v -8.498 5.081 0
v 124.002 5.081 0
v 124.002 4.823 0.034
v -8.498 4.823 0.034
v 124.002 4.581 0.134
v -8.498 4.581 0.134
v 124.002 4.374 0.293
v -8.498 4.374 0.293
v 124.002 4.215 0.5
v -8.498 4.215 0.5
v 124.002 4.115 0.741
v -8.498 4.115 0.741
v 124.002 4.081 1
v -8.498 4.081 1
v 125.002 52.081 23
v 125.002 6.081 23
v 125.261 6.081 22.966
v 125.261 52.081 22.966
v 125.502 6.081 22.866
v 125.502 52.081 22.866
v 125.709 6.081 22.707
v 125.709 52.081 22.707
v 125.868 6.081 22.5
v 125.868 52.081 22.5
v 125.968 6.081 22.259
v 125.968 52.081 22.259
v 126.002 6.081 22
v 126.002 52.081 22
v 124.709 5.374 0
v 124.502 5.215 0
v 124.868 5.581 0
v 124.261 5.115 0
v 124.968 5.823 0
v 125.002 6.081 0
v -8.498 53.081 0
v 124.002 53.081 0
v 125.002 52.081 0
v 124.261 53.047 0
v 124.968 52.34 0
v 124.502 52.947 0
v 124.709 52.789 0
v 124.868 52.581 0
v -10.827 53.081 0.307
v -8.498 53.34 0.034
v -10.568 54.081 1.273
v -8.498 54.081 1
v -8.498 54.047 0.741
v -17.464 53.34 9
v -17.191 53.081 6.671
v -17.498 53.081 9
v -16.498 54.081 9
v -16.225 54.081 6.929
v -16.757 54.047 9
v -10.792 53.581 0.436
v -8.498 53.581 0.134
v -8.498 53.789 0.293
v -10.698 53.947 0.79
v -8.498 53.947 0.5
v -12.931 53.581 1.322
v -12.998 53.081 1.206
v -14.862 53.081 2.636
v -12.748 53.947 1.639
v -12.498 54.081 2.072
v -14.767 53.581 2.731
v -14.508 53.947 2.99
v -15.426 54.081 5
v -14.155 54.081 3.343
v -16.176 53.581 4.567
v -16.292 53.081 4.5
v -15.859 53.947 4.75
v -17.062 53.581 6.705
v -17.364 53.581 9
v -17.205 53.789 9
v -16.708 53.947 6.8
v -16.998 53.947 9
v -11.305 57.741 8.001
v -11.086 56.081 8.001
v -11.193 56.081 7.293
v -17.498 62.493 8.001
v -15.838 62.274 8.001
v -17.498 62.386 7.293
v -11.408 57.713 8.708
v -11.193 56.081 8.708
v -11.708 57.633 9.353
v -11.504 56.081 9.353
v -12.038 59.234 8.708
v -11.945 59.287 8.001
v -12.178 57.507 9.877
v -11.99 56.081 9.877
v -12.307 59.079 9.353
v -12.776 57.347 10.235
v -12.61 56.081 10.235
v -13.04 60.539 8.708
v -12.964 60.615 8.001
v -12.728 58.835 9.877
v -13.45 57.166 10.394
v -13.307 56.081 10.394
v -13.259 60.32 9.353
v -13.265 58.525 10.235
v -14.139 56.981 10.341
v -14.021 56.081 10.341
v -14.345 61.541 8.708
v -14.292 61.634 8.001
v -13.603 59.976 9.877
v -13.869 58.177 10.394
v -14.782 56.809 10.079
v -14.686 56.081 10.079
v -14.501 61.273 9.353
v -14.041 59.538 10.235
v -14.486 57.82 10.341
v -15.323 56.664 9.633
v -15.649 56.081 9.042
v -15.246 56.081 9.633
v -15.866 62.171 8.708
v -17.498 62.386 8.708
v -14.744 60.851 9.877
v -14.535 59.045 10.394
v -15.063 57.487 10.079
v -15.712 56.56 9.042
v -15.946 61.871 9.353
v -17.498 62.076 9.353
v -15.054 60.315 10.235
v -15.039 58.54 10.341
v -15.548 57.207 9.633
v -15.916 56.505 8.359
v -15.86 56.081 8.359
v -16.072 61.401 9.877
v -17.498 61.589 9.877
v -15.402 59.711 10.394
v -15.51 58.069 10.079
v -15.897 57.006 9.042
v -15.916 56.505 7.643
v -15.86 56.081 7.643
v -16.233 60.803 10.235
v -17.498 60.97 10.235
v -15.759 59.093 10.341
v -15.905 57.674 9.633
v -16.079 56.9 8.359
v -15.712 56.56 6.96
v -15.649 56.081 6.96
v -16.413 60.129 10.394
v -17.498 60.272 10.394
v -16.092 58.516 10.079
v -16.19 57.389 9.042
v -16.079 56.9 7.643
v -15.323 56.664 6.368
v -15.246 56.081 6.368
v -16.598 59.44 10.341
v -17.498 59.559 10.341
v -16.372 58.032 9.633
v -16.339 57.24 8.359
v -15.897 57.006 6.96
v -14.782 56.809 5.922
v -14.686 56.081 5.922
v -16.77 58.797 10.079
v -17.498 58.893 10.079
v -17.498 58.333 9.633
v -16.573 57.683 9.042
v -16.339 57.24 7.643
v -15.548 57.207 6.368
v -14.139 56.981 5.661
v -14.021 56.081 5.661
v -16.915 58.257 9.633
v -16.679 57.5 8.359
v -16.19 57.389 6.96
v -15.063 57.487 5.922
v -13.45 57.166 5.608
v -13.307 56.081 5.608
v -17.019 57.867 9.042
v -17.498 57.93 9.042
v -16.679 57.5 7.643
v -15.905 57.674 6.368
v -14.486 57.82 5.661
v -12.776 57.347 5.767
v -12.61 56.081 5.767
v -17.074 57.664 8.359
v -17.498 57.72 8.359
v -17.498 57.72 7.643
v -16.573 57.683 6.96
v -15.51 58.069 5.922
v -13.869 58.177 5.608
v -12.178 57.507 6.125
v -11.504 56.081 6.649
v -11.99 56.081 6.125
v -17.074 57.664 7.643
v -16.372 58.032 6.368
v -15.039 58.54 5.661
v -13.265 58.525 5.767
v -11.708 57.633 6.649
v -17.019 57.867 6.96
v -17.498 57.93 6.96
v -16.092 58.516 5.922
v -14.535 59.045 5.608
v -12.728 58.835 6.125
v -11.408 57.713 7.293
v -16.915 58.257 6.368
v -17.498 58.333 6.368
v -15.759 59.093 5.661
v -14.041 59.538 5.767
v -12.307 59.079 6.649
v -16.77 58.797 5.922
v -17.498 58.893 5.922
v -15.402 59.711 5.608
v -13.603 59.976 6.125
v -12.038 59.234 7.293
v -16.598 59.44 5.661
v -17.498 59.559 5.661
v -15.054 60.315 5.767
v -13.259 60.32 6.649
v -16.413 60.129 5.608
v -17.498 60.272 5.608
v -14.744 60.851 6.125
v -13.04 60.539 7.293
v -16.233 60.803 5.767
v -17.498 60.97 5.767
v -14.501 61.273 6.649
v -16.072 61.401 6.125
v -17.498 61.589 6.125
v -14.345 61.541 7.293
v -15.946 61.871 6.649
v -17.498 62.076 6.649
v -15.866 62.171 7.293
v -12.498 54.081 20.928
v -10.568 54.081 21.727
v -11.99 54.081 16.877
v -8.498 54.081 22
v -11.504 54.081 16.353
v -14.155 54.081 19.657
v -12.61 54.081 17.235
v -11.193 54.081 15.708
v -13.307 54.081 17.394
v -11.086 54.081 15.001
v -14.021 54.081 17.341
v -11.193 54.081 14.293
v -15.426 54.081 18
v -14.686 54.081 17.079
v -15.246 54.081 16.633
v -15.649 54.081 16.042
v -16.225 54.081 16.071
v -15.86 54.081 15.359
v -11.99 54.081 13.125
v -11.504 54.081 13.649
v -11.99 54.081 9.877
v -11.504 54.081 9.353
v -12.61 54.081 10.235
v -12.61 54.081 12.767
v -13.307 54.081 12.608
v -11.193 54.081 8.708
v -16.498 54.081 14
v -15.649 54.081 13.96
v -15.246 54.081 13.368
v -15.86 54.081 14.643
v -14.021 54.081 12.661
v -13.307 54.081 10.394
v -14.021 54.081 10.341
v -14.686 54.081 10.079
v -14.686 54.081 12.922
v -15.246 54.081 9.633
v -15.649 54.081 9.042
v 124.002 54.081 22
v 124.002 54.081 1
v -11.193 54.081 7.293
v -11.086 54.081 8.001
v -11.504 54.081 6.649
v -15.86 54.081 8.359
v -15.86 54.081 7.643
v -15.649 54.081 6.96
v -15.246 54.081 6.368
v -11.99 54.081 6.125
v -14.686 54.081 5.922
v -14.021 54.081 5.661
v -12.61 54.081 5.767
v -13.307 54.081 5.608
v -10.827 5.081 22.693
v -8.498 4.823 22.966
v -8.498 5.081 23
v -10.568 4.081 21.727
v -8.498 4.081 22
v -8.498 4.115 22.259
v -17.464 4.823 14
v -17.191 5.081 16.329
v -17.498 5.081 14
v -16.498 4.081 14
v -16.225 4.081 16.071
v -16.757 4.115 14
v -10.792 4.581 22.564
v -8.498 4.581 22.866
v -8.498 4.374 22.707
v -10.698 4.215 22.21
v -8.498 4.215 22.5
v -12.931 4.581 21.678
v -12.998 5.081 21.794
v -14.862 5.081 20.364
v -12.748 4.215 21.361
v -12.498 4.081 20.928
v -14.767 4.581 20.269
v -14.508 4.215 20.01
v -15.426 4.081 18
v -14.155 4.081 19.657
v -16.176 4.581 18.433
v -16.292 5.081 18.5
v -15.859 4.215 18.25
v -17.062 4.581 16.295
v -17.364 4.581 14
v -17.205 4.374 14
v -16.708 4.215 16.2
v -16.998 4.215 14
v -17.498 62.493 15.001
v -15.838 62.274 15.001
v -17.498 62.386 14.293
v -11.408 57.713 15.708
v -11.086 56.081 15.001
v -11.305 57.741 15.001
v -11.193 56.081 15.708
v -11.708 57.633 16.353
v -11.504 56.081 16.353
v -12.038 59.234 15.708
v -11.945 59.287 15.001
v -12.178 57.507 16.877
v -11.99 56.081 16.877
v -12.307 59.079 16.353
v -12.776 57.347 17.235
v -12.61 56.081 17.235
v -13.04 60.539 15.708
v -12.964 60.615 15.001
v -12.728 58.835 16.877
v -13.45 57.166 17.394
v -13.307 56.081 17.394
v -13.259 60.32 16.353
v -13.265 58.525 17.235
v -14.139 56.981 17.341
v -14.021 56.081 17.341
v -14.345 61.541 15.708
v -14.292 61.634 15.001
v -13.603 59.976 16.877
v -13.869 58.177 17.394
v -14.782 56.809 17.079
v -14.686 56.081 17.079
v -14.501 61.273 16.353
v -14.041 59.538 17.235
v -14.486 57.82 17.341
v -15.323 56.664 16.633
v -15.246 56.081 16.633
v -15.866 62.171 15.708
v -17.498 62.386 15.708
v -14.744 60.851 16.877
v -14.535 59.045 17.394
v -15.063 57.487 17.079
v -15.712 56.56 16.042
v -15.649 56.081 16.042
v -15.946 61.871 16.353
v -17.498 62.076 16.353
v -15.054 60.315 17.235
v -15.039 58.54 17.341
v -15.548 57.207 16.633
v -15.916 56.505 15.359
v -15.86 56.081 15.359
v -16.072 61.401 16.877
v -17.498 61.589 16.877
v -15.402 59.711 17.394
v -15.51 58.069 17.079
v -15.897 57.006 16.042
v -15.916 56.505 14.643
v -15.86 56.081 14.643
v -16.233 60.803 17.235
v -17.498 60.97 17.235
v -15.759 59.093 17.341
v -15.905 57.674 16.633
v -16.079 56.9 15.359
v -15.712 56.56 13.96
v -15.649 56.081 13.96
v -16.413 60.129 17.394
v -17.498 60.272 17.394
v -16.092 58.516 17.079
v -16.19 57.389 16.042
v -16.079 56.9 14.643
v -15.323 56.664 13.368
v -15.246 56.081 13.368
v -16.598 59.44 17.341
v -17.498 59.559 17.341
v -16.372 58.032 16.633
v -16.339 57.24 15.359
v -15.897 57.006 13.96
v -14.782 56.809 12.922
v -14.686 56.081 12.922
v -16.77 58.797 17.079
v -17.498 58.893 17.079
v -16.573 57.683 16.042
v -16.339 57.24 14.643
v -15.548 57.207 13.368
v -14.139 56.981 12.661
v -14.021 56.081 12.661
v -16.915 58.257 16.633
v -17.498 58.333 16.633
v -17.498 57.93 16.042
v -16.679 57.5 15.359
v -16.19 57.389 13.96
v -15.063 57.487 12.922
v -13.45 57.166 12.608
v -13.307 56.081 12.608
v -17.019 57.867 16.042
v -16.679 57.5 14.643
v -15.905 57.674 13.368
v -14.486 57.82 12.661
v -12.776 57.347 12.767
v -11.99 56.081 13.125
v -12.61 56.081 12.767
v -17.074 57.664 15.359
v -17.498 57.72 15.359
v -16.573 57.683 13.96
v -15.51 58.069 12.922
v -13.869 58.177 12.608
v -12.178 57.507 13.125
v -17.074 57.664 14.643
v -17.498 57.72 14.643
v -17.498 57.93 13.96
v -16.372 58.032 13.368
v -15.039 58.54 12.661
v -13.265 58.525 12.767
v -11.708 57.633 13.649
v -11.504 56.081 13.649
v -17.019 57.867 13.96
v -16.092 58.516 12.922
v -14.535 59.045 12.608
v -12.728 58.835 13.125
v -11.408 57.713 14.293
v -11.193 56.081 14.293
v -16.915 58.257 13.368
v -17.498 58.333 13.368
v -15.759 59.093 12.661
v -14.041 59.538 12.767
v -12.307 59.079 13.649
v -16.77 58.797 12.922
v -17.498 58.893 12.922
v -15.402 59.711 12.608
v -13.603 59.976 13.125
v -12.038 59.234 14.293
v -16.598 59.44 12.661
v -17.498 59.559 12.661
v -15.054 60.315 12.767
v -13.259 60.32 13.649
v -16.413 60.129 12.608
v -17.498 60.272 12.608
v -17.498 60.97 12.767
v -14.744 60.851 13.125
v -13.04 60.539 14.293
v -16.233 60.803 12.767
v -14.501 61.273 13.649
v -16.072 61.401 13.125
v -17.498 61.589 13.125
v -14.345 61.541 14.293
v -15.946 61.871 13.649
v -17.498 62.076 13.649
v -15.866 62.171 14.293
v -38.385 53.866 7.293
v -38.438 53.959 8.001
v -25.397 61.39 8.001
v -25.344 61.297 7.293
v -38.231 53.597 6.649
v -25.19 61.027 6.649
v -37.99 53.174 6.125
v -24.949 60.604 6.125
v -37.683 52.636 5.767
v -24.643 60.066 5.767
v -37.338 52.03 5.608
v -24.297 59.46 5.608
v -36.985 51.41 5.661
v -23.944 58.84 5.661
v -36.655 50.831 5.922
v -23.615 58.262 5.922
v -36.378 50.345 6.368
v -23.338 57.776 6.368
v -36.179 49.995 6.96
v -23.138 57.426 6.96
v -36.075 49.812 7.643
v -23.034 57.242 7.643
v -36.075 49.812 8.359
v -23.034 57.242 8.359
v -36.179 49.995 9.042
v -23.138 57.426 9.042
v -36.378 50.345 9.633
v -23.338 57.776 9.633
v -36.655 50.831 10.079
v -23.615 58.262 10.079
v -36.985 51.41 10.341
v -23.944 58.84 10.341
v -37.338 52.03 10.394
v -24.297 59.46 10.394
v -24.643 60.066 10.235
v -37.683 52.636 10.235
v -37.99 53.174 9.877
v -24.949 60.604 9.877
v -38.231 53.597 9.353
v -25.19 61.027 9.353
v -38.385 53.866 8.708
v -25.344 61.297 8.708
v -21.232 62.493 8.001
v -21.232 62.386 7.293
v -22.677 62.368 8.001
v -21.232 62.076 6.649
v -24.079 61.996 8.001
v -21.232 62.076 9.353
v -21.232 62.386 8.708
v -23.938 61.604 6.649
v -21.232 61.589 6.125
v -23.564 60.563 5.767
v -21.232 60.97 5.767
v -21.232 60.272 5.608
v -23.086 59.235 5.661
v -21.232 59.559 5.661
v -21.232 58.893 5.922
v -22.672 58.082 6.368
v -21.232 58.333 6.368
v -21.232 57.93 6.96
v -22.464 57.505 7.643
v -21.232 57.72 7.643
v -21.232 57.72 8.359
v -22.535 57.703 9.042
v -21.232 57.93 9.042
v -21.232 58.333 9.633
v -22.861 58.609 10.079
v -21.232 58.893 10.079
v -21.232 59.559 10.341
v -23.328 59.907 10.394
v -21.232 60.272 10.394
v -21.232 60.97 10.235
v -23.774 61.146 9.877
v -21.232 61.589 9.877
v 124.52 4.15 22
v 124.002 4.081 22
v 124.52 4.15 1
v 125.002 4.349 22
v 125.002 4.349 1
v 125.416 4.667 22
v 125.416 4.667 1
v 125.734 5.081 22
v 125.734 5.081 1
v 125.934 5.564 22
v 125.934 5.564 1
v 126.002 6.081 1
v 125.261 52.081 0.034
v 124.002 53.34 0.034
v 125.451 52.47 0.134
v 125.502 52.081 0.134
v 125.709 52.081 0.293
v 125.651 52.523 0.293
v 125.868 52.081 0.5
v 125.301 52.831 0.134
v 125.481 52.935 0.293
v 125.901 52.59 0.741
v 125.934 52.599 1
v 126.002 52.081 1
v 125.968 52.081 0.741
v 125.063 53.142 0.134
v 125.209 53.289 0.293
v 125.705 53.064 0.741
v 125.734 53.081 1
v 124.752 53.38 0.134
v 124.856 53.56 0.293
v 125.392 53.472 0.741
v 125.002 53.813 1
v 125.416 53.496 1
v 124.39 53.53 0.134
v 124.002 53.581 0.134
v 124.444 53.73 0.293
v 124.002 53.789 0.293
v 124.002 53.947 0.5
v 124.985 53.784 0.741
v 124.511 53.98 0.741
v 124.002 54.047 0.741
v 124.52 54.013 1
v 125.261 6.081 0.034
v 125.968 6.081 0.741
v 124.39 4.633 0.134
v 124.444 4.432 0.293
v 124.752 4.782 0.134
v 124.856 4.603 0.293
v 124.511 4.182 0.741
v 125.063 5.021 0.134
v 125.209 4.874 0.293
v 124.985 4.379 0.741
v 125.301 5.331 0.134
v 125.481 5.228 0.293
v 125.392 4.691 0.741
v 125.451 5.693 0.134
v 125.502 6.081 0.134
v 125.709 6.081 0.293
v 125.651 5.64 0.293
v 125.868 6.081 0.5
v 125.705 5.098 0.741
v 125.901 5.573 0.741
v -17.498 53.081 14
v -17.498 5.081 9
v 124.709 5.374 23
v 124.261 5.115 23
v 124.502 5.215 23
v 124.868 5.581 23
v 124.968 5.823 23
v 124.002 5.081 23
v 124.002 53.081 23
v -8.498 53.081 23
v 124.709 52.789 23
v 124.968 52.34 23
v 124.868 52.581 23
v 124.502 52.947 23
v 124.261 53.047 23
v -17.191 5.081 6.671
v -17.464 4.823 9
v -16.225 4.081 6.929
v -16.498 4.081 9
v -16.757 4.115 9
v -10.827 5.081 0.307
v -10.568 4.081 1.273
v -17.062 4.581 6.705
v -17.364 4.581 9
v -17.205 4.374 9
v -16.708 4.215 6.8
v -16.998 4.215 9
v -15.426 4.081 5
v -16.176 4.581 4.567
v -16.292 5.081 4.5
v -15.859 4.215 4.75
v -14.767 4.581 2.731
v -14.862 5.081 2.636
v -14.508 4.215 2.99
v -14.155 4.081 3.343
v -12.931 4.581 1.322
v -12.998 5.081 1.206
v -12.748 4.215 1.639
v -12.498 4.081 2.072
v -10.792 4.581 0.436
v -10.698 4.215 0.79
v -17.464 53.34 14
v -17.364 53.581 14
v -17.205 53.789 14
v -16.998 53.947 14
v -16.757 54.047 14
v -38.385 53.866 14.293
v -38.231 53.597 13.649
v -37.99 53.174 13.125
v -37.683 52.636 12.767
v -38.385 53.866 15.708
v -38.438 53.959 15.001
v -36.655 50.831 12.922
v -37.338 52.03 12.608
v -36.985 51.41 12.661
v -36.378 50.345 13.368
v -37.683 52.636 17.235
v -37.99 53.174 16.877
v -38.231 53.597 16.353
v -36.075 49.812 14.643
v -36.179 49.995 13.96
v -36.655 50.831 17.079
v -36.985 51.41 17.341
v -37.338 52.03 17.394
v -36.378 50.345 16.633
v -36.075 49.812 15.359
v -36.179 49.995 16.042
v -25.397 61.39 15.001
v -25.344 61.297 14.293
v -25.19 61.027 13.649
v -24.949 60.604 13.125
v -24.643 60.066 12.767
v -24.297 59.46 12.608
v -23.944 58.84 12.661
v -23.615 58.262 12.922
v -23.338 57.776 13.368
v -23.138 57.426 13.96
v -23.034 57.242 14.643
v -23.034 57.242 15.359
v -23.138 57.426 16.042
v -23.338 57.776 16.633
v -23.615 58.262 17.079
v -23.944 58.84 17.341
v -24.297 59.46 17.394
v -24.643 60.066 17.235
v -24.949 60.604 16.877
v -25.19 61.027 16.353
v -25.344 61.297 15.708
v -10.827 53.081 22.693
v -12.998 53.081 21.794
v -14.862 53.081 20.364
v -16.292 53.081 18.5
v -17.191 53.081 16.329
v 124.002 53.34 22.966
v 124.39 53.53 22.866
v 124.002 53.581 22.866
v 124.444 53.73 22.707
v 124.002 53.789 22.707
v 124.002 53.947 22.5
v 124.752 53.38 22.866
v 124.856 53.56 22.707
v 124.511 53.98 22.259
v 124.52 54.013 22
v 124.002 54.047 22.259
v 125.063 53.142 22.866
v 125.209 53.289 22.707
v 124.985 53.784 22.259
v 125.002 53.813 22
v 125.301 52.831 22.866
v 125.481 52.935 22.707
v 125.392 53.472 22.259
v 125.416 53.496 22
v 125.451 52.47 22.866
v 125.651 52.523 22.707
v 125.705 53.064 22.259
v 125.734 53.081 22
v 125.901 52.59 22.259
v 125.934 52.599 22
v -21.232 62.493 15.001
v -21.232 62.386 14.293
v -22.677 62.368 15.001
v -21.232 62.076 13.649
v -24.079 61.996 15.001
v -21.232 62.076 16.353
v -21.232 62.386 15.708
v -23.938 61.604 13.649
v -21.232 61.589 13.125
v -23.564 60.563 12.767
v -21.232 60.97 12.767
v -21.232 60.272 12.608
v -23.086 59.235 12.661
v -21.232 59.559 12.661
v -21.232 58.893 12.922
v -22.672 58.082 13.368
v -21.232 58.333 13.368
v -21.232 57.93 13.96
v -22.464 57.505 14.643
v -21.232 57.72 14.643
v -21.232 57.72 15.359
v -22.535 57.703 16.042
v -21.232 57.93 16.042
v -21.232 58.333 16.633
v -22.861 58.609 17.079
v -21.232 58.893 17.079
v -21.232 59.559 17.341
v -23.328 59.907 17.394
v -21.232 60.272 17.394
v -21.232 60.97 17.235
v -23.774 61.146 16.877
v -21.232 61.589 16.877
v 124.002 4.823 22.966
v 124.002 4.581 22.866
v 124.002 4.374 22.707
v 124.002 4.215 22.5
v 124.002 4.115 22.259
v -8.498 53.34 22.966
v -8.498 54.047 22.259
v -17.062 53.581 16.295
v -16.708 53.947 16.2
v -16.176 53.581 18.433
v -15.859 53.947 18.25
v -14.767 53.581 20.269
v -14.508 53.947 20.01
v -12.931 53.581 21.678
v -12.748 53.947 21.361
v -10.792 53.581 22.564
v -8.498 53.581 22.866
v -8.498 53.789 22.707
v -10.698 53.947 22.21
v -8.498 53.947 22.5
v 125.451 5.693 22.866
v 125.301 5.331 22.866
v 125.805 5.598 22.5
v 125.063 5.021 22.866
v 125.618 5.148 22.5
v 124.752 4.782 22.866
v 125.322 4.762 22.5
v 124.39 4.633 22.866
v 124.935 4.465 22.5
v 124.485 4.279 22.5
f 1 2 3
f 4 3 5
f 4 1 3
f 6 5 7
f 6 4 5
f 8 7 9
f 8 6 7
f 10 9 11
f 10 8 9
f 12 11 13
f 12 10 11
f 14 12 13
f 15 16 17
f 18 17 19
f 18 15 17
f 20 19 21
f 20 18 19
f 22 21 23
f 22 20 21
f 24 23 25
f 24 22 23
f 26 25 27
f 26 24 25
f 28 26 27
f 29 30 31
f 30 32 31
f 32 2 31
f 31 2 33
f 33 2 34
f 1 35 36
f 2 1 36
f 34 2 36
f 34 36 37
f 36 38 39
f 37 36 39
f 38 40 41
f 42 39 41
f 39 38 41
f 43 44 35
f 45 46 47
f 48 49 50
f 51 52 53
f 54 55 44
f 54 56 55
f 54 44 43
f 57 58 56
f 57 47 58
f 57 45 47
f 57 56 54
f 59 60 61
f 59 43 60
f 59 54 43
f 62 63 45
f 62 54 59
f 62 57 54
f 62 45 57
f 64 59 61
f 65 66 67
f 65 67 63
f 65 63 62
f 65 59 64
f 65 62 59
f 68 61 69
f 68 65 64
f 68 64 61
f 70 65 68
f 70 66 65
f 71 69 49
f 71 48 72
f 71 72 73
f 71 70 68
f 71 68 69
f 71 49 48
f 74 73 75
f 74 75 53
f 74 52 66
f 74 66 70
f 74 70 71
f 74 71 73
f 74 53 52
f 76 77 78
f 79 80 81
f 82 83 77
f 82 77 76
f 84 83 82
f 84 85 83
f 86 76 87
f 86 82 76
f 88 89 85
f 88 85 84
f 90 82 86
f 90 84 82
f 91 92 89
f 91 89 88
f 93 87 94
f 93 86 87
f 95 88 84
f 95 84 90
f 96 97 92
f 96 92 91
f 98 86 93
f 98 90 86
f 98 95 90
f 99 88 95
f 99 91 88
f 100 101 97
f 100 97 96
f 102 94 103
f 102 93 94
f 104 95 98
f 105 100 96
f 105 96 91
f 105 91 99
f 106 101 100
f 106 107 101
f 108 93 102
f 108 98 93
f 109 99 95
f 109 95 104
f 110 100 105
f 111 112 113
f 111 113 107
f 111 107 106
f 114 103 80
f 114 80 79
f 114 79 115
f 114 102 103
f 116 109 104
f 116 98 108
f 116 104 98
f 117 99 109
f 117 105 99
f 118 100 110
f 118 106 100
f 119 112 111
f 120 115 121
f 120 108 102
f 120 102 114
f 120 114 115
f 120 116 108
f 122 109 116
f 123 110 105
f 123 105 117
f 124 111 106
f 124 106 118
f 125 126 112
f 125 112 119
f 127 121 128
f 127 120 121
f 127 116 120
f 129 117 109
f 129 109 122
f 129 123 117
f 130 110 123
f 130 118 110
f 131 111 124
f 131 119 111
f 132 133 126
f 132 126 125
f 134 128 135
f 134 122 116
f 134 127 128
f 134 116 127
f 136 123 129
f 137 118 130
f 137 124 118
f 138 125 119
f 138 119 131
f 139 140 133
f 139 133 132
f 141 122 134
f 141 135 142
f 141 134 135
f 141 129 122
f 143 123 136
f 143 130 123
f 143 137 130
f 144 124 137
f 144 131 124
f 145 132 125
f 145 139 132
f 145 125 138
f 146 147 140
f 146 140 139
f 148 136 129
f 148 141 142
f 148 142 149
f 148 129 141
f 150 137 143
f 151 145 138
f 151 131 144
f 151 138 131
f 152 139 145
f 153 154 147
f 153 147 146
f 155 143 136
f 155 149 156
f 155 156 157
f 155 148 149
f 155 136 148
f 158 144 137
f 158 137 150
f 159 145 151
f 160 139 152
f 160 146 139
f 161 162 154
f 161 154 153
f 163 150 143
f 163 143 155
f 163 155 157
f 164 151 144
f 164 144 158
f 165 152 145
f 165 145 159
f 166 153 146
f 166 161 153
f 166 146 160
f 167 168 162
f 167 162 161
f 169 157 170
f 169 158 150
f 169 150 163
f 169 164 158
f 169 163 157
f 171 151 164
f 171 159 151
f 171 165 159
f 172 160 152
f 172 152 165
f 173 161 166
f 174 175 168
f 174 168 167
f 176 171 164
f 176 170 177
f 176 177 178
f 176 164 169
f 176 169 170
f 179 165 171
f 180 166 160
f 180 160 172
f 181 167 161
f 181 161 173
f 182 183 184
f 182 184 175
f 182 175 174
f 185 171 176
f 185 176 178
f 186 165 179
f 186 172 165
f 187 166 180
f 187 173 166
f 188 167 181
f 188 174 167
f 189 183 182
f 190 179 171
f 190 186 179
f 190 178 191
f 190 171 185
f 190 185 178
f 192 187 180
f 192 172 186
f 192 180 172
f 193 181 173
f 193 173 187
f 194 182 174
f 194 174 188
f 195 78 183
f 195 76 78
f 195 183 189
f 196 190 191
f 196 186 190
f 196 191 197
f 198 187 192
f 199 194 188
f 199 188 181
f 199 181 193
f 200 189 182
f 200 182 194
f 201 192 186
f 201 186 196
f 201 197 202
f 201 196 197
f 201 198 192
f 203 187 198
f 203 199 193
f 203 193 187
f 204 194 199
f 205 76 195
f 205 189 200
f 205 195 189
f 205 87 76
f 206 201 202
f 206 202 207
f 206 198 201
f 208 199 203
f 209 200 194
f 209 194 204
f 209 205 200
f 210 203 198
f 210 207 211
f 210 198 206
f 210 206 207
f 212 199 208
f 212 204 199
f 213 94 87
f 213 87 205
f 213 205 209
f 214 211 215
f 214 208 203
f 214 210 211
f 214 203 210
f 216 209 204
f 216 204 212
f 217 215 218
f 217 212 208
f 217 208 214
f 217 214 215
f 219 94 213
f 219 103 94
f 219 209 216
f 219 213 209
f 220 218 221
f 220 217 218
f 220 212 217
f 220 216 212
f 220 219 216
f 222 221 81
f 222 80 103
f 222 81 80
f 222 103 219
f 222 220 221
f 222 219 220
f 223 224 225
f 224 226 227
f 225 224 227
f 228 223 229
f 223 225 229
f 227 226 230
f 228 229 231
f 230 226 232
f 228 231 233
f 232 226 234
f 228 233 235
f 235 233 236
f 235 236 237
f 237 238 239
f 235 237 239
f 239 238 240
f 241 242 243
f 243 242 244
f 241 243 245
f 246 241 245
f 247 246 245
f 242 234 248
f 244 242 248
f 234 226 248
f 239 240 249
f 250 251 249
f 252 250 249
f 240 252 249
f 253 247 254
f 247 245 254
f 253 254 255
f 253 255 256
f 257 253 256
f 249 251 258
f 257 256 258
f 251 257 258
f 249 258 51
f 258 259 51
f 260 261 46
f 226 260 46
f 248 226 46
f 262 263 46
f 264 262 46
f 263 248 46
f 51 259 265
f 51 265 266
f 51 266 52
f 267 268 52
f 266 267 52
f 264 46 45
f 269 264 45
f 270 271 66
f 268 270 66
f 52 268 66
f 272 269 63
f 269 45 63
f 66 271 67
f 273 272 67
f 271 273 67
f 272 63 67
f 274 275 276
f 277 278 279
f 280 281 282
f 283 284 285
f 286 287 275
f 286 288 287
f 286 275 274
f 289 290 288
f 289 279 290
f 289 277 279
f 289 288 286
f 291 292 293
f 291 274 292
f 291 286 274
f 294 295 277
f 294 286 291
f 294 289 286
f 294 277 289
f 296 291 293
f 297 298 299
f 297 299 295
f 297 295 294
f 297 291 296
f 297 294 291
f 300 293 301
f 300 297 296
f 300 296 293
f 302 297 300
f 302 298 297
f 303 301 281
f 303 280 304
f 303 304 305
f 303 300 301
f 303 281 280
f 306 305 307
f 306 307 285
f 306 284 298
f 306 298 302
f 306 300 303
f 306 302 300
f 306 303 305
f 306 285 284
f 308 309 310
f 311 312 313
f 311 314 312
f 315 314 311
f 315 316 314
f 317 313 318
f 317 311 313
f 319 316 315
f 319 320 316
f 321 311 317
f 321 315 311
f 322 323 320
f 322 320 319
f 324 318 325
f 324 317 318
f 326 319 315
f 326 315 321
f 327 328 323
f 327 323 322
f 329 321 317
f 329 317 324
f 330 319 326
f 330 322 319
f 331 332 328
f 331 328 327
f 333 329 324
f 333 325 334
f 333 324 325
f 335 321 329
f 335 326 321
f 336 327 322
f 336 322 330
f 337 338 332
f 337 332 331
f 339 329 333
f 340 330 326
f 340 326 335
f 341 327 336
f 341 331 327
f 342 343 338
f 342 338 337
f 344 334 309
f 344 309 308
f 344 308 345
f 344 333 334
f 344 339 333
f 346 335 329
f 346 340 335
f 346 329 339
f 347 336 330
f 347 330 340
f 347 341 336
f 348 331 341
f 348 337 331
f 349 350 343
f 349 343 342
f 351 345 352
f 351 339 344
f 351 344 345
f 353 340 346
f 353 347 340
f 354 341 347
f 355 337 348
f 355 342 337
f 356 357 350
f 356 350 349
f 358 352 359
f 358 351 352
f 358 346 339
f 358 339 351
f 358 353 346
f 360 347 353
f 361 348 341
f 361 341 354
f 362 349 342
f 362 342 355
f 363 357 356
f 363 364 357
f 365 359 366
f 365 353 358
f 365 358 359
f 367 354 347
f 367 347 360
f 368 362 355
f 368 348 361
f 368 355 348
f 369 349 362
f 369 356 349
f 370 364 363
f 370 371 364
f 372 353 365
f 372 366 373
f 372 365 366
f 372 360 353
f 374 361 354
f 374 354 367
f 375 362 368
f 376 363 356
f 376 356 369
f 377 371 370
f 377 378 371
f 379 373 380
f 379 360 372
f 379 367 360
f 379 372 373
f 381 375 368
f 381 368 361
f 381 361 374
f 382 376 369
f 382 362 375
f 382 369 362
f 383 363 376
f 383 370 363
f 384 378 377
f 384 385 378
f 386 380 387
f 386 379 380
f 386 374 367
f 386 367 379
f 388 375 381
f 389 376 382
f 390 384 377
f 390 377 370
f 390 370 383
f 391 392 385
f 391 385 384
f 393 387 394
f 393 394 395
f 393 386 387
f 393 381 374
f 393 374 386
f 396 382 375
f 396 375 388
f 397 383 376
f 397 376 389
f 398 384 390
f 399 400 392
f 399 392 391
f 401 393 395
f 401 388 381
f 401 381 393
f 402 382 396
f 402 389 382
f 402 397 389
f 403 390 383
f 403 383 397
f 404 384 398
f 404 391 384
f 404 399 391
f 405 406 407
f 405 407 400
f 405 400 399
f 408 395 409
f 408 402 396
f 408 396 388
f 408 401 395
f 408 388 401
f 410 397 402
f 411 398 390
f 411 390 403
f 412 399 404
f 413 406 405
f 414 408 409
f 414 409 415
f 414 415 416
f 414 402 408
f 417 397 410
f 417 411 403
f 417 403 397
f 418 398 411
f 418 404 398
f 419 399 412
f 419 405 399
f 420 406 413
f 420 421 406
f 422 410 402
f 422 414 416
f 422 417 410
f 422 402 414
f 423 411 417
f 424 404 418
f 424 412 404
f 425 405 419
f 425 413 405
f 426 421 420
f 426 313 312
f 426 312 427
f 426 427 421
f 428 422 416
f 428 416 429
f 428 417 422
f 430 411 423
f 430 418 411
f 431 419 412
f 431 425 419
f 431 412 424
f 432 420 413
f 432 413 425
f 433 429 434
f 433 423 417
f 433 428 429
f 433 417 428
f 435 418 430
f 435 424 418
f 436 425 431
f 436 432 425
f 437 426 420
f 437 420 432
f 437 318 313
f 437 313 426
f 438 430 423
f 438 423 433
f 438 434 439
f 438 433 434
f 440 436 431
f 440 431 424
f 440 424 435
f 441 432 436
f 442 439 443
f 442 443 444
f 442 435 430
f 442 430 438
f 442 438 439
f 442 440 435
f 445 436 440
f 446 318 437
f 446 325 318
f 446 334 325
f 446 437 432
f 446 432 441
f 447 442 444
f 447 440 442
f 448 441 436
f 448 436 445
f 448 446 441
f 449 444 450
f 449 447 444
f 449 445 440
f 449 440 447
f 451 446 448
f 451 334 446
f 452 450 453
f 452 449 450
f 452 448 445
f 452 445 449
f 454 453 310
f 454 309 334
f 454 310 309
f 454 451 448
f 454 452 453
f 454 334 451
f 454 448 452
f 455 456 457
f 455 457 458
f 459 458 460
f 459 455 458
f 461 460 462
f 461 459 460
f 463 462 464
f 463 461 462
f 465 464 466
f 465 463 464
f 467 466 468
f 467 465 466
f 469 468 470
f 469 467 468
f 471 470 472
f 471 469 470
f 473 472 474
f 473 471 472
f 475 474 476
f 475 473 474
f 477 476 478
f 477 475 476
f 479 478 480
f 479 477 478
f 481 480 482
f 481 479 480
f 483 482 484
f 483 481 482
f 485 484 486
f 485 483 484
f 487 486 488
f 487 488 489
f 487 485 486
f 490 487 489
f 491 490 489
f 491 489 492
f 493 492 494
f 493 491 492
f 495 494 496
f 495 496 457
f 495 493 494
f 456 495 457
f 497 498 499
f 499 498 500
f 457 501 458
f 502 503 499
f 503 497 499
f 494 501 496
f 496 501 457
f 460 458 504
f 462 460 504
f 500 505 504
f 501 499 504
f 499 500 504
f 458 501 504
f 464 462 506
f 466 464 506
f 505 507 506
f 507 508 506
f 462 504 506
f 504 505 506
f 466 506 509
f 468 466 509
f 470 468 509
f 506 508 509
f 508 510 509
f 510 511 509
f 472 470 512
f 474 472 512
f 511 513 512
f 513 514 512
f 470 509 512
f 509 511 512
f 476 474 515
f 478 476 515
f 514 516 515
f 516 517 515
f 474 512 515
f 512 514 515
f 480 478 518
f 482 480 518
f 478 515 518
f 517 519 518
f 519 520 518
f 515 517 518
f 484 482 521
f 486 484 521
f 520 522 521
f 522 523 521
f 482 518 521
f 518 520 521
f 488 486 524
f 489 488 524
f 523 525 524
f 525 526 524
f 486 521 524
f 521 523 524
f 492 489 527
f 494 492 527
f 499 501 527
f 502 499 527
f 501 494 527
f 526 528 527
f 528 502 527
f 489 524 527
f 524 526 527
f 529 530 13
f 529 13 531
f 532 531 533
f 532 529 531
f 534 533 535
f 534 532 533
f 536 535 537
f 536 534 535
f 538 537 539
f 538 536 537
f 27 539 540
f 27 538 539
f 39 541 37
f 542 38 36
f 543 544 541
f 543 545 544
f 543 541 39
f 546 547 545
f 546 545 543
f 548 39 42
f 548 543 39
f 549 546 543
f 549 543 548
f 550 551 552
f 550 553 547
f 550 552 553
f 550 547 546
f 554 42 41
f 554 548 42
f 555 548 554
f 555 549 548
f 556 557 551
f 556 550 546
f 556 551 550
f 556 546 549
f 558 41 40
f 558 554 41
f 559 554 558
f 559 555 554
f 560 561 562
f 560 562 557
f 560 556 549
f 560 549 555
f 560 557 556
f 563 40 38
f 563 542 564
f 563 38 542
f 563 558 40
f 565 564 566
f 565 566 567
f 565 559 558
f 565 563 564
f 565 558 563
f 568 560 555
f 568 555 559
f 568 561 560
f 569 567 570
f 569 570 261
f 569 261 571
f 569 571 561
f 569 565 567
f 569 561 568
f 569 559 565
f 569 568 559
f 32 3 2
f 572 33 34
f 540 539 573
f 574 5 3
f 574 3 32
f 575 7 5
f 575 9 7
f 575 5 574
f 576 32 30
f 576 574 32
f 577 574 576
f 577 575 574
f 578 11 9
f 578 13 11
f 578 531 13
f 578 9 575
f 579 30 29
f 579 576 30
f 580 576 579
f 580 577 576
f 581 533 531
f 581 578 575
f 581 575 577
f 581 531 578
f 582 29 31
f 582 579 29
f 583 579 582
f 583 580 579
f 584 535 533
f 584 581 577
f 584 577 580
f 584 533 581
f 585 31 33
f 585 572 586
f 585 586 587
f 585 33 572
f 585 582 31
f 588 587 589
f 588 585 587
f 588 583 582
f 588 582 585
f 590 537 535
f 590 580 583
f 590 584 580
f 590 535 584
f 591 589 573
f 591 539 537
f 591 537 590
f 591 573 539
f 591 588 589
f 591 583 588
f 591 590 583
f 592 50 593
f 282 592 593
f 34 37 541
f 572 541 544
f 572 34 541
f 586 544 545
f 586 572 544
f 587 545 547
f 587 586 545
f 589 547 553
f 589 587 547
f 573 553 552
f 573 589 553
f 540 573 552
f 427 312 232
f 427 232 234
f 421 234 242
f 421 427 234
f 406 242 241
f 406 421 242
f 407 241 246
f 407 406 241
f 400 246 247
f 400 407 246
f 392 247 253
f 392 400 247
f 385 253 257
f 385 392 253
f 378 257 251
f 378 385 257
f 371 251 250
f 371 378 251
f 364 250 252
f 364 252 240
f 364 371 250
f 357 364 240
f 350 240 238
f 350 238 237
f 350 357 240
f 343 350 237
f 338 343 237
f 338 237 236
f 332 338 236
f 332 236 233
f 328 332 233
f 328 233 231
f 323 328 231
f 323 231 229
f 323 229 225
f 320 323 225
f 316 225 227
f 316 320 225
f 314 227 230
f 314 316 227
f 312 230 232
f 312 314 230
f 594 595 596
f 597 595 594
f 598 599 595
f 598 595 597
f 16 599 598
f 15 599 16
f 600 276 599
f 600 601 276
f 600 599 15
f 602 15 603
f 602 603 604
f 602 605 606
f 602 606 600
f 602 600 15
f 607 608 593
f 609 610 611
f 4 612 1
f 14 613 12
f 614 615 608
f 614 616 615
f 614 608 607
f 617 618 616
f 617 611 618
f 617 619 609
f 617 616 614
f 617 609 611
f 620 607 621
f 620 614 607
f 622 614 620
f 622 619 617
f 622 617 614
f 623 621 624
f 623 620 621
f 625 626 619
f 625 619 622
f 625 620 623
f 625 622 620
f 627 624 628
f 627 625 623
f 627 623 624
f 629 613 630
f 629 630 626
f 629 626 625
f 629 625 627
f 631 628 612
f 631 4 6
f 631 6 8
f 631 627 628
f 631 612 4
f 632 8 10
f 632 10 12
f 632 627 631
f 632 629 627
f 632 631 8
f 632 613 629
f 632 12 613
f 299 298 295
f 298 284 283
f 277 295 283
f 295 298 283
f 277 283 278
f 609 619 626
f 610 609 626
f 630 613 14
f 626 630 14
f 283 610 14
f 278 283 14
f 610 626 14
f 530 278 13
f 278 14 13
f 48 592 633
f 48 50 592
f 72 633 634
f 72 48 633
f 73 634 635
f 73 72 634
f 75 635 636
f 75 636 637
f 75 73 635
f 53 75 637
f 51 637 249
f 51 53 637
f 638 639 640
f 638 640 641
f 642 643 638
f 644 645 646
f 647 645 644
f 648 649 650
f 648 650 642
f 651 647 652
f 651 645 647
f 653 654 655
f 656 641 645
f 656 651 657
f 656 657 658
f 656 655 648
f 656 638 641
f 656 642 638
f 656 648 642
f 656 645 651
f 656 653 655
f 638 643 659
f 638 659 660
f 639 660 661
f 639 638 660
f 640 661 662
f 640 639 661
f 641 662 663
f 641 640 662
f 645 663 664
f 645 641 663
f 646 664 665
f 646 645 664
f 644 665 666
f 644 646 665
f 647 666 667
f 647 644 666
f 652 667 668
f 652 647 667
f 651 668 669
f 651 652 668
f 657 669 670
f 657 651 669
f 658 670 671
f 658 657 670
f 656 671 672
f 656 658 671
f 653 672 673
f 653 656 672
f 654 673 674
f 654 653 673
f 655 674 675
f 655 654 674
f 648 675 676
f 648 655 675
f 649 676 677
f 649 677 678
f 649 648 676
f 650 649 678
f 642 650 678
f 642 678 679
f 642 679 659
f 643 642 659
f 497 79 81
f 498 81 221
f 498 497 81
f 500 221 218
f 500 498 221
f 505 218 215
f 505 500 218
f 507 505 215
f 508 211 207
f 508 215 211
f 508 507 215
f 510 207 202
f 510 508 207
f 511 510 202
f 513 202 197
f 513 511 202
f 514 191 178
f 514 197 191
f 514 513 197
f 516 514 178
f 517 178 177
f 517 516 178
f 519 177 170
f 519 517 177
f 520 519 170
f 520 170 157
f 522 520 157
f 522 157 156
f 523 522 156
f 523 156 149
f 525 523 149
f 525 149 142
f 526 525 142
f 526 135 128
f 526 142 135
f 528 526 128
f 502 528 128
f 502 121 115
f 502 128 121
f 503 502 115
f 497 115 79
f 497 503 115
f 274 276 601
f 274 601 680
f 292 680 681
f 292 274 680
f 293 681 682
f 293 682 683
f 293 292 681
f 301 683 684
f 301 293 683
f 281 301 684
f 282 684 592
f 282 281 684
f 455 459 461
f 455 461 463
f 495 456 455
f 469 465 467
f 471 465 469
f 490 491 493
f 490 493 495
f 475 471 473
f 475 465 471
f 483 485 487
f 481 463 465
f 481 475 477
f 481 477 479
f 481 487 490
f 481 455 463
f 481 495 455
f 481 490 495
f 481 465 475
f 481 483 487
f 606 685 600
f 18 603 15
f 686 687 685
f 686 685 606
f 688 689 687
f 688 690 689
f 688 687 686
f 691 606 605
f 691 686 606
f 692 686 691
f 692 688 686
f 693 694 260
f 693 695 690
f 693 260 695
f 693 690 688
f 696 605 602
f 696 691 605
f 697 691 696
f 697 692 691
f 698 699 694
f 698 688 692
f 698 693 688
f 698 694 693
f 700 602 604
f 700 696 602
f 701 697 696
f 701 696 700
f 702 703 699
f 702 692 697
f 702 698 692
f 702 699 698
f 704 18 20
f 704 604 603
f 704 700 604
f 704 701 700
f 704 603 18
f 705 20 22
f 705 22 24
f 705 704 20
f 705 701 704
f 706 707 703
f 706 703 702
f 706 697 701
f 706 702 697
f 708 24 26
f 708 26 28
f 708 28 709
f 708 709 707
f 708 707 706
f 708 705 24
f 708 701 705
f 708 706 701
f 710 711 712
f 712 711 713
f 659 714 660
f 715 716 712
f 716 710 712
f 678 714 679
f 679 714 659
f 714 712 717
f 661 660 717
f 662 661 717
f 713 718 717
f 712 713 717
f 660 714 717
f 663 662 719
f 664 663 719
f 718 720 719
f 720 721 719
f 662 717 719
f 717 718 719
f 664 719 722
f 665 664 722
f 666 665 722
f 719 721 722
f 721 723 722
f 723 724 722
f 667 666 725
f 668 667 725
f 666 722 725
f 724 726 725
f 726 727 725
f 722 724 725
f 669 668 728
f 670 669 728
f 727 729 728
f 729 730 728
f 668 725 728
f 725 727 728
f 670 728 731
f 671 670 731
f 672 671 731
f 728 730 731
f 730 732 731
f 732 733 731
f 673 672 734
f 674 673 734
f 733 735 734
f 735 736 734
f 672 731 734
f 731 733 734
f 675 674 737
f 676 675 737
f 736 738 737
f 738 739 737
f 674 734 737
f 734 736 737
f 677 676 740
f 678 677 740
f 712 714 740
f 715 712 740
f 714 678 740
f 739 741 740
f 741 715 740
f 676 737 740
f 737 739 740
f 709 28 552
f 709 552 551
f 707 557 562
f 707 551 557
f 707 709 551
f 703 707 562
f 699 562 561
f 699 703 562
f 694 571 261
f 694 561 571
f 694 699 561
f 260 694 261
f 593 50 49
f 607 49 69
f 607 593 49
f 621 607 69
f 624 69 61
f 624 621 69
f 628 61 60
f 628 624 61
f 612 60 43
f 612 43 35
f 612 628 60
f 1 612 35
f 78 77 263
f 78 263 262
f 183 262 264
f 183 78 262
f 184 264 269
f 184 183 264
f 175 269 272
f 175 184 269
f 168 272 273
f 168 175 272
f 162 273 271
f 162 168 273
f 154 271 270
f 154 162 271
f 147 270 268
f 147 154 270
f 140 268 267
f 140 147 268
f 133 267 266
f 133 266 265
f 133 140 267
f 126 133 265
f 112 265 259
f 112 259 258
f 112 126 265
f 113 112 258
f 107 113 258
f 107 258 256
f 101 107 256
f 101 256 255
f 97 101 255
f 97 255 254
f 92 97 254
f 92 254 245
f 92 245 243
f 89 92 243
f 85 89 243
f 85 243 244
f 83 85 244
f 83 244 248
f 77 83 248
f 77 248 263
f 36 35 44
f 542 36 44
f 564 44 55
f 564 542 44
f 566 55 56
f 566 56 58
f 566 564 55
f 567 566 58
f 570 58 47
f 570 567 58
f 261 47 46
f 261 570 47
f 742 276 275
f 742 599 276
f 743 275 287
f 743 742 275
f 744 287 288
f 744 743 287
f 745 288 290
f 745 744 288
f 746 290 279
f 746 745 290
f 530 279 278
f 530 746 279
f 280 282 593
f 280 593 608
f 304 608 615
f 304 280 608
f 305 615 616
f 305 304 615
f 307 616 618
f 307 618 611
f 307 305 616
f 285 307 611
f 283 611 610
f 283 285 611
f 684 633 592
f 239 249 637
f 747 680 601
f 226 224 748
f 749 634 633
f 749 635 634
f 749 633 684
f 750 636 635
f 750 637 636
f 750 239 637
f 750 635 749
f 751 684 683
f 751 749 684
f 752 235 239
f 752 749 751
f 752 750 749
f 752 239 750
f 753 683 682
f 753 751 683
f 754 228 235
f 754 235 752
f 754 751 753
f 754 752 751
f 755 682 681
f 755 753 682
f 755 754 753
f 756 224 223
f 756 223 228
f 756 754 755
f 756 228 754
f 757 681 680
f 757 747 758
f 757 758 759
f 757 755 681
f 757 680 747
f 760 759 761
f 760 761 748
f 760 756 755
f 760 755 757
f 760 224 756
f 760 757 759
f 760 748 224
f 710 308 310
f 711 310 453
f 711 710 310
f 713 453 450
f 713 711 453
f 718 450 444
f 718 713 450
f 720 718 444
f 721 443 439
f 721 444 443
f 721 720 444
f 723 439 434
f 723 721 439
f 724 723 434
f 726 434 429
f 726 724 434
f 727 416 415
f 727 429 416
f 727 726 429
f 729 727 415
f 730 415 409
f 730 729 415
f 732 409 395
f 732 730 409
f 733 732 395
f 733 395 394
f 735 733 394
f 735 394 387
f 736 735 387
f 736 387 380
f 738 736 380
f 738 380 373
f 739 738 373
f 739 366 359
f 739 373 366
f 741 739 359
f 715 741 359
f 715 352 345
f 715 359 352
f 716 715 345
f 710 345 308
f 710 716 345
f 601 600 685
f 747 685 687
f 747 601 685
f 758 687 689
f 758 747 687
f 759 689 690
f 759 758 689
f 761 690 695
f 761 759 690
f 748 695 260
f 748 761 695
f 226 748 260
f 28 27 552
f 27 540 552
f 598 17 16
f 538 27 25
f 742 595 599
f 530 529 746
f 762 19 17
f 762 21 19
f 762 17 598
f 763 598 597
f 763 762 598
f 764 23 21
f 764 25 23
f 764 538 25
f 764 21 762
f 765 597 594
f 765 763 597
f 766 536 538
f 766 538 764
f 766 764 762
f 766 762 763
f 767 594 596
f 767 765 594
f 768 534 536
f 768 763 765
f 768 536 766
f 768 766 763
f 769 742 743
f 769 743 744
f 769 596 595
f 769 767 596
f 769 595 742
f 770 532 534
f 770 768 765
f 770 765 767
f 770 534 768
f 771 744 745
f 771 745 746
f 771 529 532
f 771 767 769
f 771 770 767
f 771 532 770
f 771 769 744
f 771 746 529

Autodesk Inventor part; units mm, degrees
ref_plane "YZ Plane" through (0, 0, 0) normal (1, 0, 0) x (0, 1, 0)
ref_plane "XZ Plane" through (0, 0, 0) normal (0, 1, 0) x (-1, 0, 0)
sketch "Szkic1" plane through (0, 0, 0) normal (0, 0, 1) x (1, 0, 0)
  line L0 (-17.4978, 4.0814) -> (126.0022, 4.0814)
  line L1 (126.0022, 4.0814) -> (126.0022, 54.0814)
  line L2 (126.0022, 54.0814) -> (-17.4978, 54.0814)
  line L3 (-17.4978, 54.0814) -> (-17.4978, 4.0814)
  point P0 (0, 0)
  dimension "d0" = 143.5
  dimension "d1" = 50
extrude "Wyciągnięcie proste1" add sketch "Szkic1" along normal blind 23
fillet "Zaokrąglenie1" radius 9 2 edges at (-17.4978, 29.0814, 23) (-17.4978, 29.0814, 0)
fillet "Zaokrąglenie2" radius 2 2 edges at (126.0022, 4.0814, 11.5) (126.0022, 54.0814, 11.5)
fillet "Zaokrąglenie3" radius 1 16 edges at (125.4164, 4.6672, 23) (126.0022, 29.0814, 23) (125.4164, 53.4956, 23) (57.7522, 54.0814, 23) (-14.8618, 54.0814, 20.364) (-17.4978, 54.0814, 11.5) (-14.8618, 54.0814, 2.636) (57.7522, 54.0814, 0) (125.4164, 53.4956, 0) (126.0022, 29.0814, 0) (125.4164, 4.6672, 0) (57.7522, 4.0814, 0) (-14.8618, 4.0814, 2.636) (-17.4978, 4.0814, 11.5) (-14.8618, 4.0814, 20.364) (57.7522, 4.0814, 23)
sketch "Szkic2" plane through (0, 0, 23) normal (0, 0, 1) x (1, 0, 0)
  line L0 (2.5572, 48.5476) -> (113.8689, 48.5476) construction
  line L1 (113.8689, 48.5476) -> (113.8689, 11.3084) construction
  line L2 (113.8689, 11.3084) -> (2.5572, 11.3084) construction
  line L3 (2.5572, 11.3084) -> (2.5572, 48.5476) construction
  point P0 (0, 0)
ref_plane "Płaszczyzna konstrukcyjna1" through (0, 0, 15) normal (0, 0, 1) x (1, 0, 0)
sketch "Szkic3" plane through (0, 0, 15) normal (0, 0, 1) x (1, 0, 0)
  line L0 (-16.4978, 54.0814) -> (-8.4978, 54.0814) projected
  line L1 (-17.4978, 53.0814) -> (-17.4978, 5.0814) projected
  line L2 (-13.4978, 54.0814) -> (-13.4978, 56.0814)
  line L3 (-18.4978, 60.0814) -> (-17.4978, 60.0814)
  arc A0 (-13.4978, 56.0814) -> (-17.4978, 60.0814) centre (-17.4978, 56.0814) ccw
  line L4 (-18.4978, 60.0814) -> (-21.2325, 60.0814)
  line L5 (-24.203, 59.2945) -> (-37.2438, 51.8639)
  arc A1 (-21.2325, 60.0814) -> (-24.203, 59.2945) centre (-21.2325, 54.0814) ccw
  point P0 (0, 0)
  point P1 (-13.4978, 58.0814)
  dimension "d15" = 4
  dimension "d16" = 4
  dimension "d20" = 4
  dimension "d24" = 6
  dimension "d25" = 6
sketch "Szkic4" plane through (-8.4978, 54.0814, 1) normal (0, 1, 0) x (1, 0, 0)
  circle A0 centre (-4.9887, -14.0009) radius 2.4
  point P0 (8.4978, 1)
  dimension "d21" = 4.8
sweep "Przeciągnięcie1" add profiles "Szkic4" path "Szkic3" path curves L2 A0 L3 L4 A1 L5
pattern_linear "Szyk prostokątny1" count 2 spacing 7 along (0, 0, -1) of "Przeciągnięcie1"
decal "Pokrycie bitmapą1"
properties part number "COTS_ZIPPY_Li-Po_Battery_5000mAh_3S"
